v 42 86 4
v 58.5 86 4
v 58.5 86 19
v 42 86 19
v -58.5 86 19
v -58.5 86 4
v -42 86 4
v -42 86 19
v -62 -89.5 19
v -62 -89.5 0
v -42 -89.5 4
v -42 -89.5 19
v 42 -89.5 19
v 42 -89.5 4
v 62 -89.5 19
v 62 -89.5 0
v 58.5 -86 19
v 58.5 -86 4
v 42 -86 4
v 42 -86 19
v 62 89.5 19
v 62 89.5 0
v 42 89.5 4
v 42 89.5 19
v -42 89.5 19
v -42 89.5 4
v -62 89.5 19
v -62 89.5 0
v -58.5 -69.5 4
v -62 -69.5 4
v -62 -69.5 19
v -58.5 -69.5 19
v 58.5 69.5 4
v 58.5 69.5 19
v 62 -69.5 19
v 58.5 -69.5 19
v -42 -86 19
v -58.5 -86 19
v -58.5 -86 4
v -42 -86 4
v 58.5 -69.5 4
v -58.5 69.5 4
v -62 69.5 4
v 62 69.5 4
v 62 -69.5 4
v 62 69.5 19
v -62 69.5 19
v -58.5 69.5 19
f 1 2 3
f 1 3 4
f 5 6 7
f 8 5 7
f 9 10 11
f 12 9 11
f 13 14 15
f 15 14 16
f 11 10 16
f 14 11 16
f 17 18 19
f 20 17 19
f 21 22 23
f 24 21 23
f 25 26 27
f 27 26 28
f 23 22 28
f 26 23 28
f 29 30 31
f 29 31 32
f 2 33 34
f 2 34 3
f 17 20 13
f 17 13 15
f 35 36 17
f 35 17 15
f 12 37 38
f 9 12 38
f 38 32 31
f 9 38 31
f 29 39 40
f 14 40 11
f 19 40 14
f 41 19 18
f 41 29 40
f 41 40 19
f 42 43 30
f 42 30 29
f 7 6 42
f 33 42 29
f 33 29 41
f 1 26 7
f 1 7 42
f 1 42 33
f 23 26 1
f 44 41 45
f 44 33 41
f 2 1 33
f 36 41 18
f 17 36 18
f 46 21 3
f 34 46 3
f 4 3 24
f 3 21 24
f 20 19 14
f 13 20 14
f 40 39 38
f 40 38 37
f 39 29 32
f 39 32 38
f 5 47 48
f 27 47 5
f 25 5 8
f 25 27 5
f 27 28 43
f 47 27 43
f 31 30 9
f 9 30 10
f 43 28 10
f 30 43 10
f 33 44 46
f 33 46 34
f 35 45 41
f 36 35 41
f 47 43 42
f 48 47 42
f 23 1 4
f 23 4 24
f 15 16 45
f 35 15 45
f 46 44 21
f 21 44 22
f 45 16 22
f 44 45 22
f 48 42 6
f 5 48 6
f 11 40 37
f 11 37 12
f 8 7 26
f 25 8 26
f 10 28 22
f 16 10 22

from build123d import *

# Parameters (mm, degrees)
SKETCH_1_W      = 124
SKETCH_1_H      = 179
EXTRUDE_1_DEPTH = 4
EXTRUDE_2_DEPTH = 15


with BuildPart() as part:
    # 草圖1 → 填料-伸長1 (new body)
    with BuildSketch(Plane.XY):
        Rectangle(SKETCH_1_W, SKETCH_1_H)
    extrude(amount=EXTRUDE_1_DEPTH)

    # 草圖3 → 填料-伸長2 (add)
    with BuildSketch(Plane.XY.offset(4)):
        Polygon((-62, 89.5), (-62, 69.5), (-58.5, 69.5), (-58.5, 86), (-42, 86), (-42, 89.5), align=None)
        Polygon((42, 86), (42, 89.5), (62, 89.5), (62, 69.5), (58.5, 69.5), (58.5, 86), align=None)
        Polygon((62, -89.5), (62, -69.5), (58.5, -69.5), (58.5, -86), (42, -86), (42, -89.5), align=None)
        Polygon((-42, -86), (-42, -89.5), (-62, -89.5), (-62, -69.5), (-58.5, -69.5), (-58.5, -86), align=None)
    extrude(amount=EXTRUDE_2_DEPTH)


solid = part.part
